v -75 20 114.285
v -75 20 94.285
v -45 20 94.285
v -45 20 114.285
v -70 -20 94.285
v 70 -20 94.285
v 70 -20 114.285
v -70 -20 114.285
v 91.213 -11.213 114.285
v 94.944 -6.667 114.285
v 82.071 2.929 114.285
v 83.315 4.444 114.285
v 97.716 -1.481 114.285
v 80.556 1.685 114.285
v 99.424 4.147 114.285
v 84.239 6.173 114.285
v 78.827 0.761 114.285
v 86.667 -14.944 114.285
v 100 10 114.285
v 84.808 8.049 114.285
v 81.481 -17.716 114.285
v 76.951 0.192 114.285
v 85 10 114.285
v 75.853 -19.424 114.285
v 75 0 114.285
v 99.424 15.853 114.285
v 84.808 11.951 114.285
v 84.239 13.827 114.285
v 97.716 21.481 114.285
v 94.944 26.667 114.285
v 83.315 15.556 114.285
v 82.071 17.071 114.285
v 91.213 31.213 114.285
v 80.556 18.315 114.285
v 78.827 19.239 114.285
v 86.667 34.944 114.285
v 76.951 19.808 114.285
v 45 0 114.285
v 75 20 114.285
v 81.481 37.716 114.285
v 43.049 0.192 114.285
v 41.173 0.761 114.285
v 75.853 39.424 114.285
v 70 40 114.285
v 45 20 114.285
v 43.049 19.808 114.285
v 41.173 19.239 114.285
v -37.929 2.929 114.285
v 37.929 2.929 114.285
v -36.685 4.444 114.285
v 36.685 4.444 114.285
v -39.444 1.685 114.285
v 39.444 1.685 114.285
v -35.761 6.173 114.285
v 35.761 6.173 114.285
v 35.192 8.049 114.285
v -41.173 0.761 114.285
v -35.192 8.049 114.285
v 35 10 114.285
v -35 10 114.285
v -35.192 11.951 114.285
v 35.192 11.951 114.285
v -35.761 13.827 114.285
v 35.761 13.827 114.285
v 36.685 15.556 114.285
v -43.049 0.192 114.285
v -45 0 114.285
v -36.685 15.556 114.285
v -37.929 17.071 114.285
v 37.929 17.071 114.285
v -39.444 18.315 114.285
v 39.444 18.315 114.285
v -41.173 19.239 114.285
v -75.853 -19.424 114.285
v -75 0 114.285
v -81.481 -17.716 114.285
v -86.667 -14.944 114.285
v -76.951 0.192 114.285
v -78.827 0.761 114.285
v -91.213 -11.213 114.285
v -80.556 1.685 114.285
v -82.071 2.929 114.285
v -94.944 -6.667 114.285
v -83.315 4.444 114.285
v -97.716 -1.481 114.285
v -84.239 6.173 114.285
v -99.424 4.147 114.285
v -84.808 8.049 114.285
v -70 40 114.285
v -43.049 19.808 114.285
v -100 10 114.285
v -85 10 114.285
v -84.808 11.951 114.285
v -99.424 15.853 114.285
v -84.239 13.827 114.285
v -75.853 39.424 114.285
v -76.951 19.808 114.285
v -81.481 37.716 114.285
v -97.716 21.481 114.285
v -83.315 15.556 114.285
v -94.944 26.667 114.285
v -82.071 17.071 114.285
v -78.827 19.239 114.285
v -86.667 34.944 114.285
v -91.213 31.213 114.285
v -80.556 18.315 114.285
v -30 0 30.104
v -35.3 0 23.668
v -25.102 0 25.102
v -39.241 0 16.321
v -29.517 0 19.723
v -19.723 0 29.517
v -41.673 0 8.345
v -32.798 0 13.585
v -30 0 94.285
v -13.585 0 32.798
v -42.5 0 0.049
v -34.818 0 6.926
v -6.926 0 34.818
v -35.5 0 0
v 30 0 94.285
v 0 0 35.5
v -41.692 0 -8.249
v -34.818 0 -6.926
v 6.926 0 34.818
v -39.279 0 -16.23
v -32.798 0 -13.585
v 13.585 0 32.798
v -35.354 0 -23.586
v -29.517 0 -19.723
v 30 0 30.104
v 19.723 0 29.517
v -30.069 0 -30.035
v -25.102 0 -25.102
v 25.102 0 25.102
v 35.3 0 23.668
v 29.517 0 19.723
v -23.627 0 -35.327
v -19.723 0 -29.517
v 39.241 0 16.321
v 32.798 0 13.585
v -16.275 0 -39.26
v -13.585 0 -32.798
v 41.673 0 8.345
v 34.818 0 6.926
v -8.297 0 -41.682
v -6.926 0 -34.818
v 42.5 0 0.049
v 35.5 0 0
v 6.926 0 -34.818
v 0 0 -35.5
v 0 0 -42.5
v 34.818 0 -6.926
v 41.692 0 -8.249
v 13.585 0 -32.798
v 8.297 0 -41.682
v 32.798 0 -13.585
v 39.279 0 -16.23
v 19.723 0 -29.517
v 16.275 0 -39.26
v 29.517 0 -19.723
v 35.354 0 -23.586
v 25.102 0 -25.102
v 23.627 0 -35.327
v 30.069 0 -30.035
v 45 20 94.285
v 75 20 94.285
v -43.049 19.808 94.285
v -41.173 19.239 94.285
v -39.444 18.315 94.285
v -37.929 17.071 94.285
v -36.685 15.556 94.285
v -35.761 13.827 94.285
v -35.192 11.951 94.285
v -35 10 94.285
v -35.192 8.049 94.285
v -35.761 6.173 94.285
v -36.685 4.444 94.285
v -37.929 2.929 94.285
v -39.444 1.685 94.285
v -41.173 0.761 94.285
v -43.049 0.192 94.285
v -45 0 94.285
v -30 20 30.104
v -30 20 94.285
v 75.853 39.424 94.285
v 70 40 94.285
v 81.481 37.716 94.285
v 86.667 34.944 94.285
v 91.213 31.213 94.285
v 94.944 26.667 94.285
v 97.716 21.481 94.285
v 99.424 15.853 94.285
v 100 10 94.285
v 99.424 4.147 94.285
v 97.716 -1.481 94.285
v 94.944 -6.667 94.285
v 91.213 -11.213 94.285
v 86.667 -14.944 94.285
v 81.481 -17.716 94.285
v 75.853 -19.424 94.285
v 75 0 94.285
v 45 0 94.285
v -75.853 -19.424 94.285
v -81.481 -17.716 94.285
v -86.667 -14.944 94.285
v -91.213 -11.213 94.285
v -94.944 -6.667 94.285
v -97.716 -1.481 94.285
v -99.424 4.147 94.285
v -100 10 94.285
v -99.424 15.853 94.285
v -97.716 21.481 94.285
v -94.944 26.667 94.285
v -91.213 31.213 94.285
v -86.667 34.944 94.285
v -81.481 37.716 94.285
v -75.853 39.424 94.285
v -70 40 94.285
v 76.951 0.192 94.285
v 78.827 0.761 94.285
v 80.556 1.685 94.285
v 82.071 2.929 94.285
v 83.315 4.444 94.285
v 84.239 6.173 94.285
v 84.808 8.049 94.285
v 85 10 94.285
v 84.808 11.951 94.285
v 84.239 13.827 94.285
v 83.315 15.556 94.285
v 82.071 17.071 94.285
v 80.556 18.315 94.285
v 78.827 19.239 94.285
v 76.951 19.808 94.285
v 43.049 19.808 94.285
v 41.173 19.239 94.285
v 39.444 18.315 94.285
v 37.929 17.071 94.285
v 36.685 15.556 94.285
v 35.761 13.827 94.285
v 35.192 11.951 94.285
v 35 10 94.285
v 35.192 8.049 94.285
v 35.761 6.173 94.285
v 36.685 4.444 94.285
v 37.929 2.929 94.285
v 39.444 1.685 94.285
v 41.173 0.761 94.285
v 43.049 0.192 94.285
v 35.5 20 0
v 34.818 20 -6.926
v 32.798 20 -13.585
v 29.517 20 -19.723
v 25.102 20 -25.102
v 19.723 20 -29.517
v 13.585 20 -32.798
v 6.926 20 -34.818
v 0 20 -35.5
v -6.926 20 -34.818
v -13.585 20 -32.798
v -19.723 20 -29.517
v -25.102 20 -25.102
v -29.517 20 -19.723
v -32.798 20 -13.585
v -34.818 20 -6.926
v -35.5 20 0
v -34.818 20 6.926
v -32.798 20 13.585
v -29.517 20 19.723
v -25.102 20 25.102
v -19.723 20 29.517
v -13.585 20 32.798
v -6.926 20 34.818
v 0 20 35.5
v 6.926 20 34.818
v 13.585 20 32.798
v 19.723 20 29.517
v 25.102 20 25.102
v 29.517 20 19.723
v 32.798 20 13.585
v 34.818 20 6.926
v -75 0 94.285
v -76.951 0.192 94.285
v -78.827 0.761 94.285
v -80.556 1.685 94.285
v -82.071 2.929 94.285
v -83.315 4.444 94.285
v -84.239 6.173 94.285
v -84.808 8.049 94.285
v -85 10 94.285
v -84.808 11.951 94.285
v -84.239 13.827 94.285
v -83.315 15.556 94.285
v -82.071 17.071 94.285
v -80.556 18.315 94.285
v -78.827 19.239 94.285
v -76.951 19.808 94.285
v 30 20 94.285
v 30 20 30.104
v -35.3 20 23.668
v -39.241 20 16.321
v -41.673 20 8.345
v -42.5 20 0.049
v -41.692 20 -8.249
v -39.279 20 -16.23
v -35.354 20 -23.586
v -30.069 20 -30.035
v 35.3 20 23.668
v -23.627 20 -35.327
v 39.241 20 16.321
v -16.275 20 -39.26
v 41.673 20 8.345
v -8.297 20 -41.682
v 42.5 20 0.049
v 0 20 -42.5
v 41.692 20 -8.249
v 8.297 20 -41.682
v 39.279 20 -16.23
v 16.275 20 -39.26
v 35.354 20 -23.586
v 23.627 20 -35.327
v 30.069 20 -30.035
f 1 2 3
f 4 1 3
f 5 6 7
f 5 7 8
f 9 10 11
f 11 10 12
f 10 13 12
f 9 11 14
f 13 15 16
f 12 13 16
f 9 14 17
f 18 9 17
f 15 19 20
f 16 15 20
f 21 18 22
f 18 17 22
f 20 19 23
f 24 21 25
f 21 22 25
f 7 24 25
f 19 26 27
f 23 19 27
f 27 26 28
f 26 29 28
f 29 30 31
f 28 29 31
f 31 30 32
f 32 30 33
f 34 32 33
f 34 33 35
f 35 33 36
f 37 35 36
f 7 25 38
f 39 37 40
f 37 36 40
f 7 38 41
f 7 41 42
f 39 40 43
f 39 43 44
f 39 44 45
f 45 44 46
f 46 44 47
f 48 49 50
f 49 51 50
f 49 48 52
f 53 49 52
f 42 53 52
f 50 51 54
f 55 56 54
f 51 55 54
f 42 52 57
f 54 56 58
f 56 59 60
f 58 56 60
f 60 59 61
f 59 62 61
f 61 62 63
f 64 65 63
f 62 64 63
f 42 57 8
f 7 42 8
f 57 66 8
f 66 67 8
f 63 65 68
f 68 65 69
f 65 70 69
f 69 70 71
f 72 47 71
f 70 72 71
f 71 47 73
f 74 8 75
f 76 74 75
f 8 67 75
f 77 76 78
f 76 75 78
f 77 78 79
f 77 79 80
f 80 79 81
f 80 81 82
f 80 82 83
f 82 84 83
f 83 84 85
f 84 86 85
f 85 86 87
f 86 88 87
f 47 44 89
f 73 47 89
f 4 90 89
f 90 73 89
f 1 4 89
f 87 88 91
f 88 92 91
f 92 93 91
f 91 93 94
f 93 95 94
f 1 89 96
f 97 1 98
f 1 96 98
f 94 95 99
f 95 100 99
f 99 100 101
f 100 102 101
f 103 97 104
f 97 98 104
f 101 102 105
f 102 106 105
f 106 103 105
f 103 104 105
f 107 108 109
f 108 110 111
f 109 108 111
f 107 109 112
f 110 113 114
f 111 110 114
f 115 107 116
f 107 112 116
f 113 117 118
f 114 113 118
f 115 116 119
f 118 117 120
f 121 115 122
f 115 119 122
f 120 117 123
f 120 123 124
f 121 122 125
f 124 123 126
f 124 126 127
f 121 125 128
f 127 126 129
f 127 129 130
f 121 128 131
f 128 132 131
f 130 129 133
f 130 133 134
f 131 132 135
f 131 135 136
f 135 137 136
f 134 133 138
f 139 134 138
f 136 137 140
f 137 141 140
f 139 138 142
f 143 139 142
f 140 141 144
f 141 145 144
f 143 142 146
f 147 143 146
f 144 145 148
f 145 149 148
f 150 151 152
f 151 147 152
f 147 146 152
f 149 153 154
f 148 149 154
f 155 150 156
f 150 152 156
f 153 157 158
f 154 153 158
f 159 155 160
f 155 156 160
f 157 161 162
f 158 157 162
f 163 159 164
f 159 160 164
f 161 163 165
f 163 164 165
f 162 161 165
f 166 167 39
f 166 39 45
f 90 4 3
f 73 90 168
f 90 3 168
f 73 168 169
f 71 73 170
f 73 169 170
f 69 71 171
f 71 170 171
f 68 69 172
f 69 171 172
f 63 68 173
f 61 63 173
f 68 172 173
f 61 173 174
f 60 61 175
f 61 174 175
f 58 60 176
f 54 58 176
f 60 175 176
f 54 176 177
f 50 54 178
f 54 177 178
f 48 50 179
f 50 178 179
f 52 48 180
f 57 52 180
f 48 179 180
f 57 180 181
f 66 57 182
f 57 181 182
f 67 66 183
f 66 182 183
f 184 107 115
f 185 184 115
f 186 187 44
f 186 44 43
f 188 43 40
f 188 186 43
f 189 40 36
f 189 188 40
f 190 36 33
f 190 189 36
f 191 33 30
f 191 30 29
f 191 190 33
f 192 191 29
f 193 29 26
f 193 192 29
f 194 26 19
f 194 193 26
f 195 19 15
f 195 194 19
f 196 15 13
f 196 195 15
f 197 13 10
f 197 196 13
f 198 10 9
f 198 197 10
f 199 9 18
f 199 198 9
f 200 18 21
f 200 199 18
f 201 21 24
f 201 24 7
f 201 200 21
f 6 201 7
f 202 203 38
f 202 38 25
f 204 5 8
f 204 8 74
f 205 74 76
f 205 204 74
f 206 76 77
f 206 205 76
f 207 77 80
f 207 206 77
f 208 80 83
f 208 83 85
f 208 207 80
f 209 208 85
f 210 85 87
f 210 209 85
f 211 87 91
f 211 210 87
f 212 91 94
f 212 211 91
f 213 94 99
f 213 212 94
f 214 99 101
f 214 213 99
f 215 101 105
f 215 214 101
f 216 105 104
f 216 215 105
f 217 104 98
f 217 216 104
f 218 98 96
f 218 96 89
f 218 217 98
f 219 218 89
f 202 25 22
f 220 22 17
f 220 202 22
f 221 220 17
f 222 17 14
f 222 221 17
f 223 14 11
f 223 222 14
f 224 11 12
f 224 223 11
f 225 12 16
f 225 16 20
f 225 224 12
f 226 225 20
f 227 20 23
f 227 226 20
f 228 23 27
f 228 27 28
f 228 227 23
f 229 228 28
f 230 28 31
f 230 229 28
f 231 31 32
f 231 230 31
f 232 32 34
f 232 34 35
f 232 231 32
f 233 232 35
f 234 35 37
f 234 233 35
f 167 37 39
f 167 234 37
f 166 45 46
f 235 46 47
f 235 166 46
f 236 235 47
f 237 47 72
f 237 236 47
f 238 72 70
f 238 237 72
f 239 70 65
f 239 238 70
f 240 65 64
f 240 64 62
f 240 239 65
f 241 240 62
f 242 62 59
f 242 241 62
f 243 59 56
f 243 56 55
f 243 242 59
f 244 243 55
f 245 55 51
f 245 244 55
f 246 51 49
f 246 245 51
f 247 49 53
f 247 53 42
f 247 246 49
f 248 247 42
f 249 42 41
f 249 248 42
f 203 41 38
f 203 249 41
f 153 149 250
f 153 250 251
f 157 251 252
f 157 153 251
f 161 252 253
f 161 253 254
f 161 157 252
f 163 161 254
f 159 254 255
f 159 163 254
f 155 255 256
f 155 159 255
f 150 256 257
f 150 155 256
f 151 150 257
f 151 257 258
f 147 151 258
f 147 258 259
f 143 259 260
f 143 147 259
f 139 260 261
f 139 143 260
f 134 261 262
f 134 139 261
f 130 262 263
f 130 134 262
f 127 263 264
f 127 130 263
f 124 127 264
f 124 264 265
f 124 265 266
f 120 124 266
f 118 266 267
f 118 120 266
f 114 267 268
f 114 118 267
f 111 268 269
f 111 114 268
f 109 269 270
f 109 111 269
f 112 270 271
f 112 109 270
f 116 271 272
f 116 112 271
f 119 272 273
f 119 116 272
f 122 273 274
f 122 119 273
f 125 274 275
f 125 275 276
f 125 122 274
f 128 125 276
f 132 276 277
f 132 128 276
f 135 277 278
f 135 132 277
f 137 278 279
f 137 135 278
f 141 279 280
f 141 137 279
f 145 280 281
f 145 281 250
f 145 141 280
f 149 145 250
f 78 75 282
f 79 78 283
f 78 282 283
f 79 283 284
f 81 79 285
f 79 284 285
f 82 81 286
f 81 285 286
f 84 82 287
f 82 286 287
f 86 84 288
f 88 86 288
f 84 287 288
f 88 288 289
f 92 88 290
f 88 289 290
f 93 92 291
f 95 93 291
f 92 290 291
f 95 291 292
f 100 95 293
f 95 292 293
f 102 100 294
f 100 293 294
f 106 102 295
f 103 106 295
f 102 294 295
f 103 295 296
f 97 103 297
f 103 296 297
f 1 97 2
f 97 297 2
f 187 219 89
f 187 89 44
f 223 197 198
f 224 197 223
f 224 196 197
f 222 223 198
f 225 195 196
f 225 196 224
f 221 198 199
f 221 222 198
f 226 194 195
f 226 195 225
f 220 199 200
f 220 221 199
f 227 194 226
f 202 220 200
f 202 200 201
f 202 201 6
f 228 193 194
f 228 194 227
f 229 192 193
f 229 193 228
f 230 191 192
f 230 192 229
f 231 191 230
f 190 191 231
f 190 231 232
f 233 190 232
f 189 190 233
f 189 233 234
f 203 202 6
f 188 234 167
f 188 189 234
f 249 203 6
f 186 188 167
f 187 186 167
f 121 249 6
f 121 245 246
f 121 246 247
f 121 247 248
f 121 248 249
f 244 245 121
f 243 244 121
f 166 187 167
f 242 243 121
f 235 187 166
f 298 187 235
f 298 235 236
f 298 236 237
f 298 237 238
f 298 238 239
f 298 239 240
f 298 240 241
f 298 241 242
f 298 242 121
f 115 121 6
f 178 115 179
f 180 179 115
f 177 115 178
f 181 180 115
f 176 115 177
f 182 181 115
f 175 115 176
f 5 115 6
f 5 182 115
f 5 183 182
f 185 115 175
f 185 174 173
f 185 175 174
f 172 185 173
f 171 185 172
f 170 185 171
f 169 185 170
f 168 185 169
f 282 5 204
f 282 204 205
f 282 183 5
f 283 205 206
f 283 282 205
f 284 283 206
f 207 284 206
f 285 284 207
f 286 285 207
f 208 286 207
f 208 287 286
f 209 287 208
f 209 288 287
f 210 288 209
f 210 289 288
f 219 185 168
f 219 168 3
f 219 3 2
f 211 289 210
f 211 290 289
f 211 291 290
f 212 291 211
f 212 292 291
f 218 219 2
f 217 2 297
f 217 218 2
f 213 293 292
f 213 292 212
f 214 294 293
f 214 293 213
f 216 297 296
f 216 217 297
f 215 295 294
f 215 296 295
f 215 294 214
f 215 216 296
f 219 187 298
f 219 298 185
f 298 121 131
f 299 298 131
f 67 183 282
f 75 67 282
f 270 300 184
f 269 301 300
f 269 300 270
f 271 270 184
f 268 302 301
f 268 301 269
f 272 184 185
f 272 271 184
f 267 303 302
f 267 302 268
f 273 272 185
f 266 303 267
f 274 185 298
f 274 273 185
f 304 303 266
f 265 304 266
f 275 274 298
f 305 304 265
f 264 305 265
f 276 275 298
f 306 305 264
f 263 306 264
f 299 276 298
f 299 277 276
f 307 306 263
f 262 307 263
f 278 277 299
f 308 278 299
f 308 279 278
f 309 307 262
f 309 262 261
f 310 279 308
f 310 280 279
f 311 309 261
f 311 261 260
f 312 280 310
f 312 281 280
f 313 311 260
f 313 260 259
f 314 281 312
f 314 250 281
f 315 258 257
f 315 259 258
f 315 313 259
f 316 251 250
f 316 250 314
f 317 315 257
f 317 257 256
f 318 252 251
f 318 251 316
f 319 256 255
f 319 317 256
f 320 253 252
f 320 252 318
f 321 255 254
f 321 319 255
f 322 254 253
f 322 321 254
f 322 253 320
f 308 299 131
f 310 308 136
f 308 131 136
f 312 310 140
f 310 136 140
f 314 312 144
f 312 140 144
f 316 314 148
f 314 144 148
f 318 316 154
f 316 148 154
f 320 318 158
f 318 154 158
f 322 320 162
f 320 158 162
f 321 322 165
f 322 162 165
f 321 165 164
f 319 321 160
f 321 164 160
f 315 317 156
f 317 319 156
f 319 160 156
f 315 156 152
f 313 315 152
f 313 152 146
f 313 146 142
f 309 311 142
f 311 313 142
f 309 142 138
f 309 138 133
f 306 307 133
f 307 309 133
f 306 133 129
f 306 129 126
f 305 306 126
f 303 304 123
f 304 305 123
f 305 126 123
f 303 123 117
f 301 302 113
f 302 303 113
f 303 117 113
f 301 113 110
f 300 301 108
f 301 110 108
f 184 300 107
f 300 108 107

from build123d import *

# Parameters (mm, degrees)
SKETCH1_R           = 42.5
SKETCH1_R_2         = 35.5
BOSS_EXTRUDE3_DEPTH = 20
BOSS_EXTRUDE4_DEPTH = 20
BOSS_EXTRUDE6_DEPTH = 20


with BuildPart() as part:
    # Sketch1 → Boss-Extrude3 (new body)
    with BuildSketch(Plane(origin=(0, 0, 0), x_dir=(1, 0, 0), z_dir=(0, 1, 0))):
        Circle(SKETCH1_R)
        Circle(SKETCH1_R_2, mode=Mode.SUBTRACT)
    extrude(amount=BOSS_EXTRUDE3_DEPTH)

    # Sketch5 → Boss-Extrude4 (add)
    with BuildSketch(Plane(origin=(0, 0, 0), x_dir=(1, 0, 0), z_dir=(0, 1, 0))):
        with BuildLine():
            Line((-30, -94.285), (30, -94.285))
            Line((30, -94.285), (30, -30.103986447))
            ThreePointArc((30, -30.103986447), (0, -42.5), (-30, -30.103986447))
            Line((-30, -30.103986447), (-30, -94.285))
        make_face()
    extrude(amount=BOSS_EXTRUDE4_DEPTH)

    # Sketch6 → Boss-Extrude6 (add)
    with BuildSketch(Plane.XY.offset(94.285)):
        with BuildLine():
            Line((70, -20), (-70, -20))
            ThreePointArc((-70, -20), (-100, 10), (-70, 40))
            Line((-70, 40), (70, 40))
            ThreePointArc((70, 40), (100, 10), (70, -20))
        make_face()
        with BuildLine():
            Line((-45, 0), (-75, 0))
            ThreePointArc((-75, 0), (-85, 10), (-75, 20))
            Line((-75, 20), (-45, 20))
            ThreePointArc((-45, 20), (-35, 10), (-45, 0))
        make_face(mode=Mode.SUBTRACT)
        with BuildLine():
            Line((45, 0), (75, 0))
            ThreePointArc((75, 0), (85, 10), (75, 20))
            Line((75, 20), (45, 20))
            ThreePointArc((45, 20), (35, 10), (45, 0))
        make_face(mode=Mode.SUBTRACT)
    extrude(amount=BOSS_EXTRUDE6_DEPTH)


solid = part.part
